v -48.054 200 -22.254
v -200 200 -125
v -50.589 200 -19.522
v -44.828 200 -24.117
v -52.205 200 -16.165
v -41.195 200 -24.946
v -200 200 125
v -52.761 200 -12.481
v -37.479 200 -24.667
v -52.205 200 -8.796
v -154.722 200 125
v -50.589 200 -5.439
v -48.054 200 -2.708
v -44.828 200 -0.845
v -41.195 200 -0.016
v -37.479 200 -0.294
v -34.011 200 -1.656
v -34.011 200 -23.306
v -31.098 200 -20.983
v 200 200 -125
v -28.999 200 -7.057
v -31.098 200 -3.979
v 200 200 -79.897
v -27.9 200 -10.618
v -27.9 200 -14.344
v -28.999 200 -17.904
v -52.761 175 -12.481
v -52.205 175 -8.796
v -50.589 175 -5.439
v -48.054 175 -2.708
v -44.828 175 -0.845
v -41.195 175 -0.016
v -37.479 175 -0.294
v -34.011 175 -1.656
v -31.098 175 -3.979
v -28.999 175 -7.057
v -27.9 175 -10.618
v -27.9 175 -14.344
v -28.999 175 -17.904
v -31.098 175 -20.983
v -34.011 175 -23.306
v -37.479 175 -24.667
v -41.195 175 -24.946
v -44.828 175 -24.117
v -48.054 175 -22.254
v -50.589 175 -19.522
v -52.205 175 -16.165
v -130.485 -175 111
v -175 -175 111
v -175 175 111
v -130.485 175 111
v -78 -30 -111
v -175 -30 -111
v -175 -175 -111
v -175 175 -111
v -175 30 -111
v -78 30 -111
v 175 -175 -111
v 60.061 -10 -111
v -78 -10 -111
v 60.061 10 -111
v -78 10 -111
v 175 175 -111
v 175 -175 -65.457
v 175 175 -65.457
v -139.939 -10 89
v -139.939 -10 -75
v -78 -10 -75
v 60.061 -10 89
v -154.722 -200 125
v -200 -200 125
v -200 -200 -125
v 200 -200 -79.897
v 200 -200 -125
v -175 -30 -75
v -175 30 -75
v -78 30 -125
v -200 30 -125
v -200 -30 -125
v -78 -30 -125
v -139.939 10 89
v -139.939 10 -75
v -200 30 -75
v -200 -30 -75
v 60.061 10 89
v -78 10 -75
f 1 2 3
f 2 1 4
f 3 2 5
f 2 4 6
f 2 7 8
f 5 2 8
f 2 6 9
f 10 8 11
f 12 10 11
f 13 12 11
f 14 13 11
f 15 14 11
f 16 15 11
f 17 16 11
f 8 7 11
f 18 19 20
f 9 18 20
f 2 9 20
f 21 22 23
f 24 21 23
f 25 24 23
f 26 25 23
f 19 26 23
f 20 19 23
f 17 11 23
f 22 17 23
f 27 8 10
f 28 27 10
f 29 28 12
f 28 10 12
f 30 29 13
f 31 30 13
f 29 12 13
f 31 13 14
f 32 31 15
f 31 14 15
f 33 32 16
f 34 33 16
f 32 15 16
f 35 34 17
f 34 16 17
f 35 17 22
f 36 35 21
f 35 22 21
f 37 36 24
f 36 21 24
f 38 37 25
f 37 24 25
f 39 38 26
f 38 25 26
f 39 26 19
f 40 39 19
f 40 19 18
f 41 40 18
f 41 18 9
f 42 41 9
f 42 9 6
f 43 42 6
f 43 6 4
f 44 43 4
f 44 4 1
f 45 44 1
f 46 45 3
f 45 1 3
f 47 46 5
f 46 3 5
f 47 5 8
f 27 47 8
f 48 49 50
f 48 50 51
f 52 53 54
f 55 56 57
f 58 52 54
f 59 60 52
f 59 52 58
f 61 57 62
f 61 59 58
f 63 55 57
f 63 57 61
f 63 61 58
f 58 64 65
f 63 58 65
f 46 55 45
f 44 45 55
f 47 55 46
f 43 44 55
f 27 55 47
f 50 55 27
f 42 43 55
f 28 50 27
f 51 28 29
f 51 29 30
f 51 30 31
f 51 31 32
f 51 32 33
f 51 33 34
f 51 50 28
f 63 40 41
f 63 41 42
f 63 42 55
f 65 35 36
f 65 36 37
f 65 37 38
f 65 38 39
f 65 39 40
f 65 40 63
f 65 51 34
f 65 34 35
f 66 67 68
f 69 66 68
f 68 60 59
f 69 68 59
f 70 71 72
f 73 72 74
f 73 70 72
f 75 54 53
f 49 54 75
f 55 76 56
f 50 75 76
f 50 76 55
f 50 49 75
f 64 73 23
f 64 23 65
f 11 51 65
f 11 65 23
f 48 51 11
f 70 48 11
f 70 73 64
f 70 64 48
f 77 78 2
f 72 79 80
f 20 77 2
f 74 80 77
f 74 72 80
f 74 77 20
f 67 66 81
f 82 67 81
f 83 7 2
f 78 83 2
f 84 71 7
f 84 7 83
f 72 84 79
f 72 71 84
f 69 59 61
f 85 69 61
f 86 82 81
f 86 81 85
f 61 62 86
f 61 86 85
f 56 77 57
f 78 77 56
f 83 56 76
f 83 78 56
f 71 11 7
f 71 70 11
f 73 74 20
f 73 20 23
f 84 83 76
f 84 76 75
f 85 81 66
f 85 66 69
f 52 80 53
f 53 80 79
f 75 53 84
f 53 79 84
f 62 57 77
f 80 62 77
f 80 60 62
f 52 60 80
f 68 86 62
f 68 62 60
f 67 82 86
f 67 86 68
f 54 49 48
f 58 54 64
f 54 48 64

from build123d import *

# Parameters (mm, degrees)
F1_DEPTH = 200
F2_W     = 350
F2_H     = 350
F3_DEPTH = 111
F4_W     = 200
F4_H     = 20
F5_DEPTH = 200
F6_R     = 12.5
F7_DEPTH = 25
F8_W     = 60
F8_H     = 100
F9_DEPTH = 122


with BuildPart() as f1:
    # F0 (on Front) → F1 (new body, symmetric)
    with BuildSketch(Plane.XZ):
        Polygon((-200, 125), (-200, -125), (200, -125), (200, -79.8974335194), (-154.72202003, 125), align=None)
    extrude(amount=F1_DEPTH, both=True)

    # F2 (on Top) → F3 (cut, symmetric)
    with BuildSketch(Plane.XY):
        Rectangle(F2_W, F2_H)
    extrude(amount=F3_DEPTH, both=True, mode=Mode.SUBTRACT)

    # F4 (on face) → F5 (join)
    with BuildSketch(Plane.XY.offset(-111)):
        with Locations((-39.9386547506, 0)):
            Rectangle(F4_W, F4_H)
    extrude(amount=F5_DEPTH)

    # F6 (on face) → F7 (cut)
    with BuildSketch(Plane(origin=(0, 200, 0), x_dir=(-1, 0, 0), z_dir=(0, 1, 0))):
        with Locations((40.2607396245, -12.4808279797)):
            Circle(F6_R)
    extrude(amount=-F7_DEPTH, mode=Mode.SUBTRACT)

    # F8 (on face) → F9 (cut)
    with BuildSketch(Plane(origin=(-200, 0, 0), x_dir=(0, -1, 0), z_dir=(-1, 0, 0))):
        with Locations((0, -125)):
            Rectangle(F8_W, F8_H)
    extrude(amount=-F9_DEPTH, mode=Mode.SUBTRACT)


solid = f1.part
